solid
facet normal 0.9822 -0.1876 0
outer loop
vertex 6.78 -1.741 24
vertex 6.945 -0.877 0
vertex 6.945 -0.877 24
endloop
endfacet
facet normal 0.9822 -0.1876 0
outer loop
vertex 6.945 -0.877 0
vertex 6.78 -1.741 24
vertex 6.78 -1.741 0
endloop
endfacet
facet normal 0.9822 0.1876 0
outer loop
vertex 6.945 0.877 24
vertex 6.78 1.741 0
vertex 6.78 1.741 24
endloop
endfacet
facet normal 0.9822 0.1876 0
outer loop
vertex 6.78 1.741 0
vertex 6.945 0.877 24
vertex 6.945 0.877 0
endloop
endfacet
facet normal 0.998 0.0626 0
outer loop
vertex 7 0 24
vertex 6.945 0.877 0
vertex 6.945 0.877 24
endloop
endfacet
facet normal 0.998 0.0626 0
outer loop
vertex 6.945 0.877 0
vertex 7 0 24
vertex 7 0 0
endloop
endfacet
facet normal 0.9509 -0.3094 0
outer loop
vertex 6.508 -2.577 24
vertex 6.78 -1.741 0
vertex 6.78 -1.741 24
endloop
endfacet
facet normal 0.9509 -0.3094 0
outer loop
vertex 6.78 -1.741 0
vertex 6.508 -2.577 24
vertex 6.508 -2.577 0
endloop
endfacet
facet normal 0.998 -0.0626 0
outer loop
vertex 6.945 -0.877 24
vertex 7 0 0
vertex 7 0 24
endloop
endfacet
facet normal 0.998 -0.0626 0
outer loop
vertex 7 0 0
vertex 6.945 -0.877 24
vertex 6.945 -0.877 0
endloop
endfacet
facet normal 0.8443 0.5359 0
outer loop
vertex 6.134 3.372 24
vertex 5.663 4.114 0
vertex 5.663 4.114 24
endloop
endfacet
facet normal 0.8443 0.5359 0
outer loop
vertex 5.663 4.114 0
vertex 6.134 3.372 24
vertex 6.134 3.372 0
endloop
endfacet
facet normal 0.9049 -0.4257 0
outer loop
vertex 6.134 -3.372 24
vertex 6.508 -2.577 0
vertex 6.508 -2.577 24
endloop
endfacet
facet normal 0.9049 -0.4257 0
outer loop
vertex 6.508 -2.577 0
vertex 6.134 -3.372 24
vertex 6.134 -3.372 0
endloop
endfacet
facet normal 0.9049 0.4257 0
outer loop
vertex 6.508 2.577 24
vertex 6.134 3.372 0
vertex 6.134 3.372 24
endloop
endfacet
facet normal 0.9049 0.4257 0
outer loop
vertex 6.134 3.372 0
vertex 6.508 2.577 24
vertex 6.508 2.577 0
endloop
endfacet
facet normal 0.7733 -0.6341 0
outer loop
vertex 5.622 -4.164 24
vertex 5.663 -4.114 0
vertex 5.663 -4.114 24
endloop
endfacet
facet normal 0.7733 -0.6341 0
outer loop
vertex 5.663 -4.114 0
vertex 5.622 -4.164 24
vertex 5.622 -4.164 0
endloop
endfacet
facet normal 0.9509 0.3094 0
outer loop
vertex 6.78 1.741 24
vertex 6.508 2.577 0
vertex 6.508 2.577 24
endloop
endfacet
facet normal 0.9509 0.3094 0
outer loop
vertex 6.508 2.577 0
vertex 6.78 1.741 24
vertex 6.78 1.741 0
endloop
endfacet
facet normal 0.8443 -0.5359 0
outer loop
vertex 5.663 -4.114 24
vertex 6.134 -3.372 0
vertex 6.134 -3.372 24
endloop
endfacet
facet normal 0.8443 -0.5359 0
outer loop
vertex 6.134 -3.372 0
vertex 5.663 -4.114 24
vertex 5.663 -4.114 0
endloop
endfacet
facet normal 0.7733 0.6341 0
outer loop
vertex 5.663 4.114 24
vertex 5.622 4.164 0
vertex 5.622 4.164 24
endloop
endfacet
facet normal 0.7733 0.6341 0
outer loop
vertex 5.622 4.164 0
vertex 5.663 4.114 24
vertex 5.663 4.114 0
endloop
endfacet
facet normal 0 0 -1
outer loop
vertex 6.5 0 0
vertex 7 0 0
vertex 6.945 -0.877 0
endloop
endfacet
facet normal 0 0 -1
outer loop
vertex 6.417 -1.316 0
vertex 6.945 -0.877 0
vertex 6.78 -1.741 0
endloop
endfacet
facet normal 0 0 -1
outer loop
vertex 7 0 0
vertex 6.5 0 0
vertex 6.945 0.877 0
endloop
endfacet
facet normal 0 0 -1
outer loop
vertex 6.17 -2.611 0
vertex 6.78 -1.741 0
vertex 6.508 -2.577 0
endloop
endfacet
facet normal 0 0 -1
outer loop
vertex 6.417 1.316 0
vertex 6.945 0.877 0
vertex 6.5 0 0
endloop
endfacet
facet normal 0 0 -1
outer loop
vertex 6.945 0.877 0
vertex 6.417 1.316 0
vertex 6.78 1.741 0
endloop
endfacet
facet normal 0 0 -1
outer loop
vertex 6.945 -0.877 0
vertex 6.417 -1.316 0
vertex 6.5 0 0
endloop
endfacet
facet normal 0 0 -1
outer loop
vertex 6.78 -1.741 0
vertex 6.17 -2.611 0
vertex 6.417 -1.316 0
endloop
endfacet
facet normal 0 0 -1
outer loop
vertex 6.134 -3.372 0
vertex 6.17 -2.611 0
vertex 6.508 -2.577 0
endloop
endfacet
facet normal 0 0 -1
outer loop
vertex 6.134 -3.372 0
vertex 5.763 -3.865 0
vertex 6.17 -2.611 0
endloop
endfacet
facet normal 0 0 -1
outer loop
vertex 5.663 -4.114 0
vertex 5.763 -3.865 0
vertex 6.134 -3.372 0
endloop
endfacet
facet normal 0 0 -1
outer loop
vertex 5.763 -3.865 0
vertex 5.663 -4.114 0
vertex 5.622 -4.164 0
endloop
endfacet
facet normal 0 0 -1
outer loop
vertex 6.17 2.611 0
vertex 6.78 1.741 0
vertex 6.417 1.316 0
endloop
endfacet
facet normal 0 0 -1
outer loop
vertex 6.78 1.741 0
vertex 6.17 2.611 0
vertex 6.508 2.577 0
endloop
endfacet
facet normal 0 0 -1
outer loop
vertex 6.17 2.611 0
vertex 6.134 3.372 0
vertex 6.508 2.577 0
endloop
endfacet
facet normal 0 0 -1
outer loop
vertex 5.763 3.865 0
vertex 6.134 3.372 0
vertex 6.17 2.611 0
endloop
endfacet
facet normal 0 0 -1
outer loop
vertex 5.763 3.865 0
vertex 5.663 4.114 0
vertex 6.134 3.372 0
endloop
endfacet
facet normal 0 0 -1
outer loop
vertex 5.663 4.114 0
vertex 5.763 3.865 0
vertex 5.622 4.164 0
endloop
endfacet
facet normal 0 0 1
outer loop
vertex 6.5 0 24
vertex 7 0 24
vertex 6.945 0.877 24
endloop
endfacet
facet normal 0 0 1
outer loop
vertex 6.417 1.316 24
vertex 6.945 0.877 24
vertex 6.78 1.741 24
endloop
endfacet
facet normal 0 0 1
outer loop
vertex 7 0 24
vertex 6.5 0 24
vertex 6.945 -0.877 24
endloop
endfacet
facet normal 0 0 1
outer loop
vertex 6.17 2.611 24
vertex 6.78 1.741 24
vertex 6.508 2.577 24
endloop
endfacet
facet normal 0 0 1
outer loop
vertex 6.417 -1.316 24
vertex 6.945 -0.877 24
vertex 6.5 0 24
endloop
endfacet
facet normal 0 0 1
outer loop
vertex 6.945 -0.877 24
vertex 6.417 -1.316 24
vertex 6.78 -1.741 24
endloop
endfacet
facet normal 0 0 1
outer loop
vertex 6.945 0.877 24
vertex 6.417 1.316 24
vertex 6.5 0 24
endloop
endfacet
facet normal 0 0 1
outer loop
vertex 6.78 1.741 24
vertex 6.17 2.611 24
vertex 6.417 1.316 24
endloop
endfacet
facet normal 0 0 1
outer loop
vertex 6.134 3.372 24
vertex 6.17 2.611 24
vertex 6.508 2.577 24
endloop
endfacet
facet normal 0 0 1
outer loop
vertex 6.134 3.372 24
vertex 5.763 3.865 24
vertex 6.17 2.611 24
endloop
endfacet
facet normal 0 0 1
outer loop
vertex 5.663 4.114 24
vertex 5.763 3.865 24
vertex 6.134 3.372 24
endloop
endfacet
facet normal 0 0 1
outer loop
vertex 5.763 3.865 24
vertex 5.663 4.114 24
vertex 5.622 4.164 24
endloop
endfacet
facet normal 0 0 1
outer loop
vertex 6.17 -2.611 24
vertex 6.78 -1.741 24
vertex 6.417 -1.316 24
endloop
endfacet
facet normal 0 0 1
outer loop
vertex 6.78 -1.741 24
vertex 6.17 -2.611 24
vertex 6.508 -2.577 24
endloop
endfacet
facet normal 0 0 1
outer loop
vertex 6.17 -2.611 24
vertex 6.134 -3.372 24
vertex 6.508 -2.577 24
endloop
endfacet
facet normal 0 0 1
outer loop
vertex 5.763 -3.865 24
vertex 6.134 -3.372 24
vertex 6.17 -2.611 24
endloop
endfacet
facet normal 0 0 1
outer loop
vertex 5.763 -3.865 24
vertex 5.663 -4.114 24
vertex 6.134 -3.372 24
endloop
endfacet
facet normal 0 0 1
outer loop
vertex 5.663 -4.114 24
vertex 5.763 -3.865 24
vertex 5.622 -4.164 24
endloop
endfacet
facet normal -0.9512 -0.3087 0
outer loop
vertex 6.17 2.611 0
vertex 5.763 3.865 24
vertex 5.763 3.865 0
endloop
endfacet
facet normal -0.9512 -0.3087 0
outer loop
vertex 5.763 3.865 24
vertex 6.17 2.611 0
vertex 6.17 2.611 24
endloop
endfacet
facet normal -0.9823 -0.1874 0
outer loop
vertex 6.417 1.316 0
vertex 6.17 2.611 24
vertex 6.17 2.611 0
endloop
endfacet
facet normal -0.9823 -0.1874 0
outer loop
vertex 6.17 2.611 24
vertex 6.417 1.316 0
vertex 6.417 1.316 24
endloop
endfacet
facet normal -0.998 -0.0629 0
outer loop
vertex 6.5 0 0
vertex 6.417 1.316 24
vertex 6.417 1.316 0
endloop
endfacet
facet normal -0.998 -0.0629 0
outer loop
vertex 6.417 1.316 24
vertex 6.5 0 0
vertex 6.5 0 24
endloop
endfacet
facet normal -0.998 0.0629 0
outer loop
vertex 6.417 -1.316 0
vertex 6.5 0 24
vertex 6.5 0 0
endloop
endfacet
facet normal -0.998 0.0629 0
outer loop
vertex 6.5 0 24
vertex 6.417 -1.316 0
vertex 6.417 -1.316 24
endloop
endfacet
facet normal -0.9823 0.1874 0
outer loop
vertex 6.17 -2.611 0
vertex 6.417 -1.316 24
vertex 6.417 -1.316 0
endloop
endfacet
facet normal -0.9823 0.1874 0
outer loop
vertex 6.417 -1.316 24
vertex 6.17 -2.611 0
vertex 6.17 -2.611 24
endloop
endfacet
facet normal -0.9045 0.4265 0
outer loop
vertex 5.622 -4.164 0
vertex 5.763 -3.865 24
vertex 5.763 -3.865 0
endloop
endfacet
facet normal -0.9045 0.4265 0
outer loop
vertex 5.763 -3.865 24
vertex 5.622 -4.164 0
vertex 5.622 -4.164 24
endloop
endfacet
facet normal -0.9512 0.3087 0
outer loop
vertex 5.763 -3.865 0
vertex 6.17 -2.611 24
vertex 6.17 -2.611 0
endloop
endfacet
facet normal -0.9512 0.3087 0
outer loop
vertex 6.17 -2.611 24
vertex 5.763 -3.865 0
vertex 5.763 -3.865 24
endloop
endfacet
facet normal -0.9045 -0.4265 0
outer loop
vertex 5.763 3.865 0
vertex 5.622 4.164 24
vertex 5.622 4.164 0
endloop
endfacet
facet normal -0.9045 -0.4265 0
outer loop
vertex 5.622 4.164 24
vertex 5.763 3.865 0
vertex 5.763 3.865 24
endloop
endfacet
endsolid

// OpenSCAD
$fn = 50;


difference() {
	union() {
		cylinder(h = 24, r = 7.0000000000);
		translate(v = [-7.0000000000, 0, 0]) {
			cylinder(h = 24, r = 7.0000000000);
		}
	}
	union() {
		cylinder(h = 24, r = 3.2500000000);
		cylinder(h = 24, r = 1.8000000000);
		cylinder(h = 24, r = 1.8000000000);
		cylinder(h = 24, r = 1.8000000000);
		translate(v = [-11.5000000000, 0, 0]) {
			hull() {
				translate(v = [-3.7500000000, 0.0000000000, 0]) {
					cylinder(h = 24, r = 7.5000000000);
				}
				translate(v = [3.7500000000, 0.0000000000, 0]) {
					cylinder(h = 24, r = 7.5000000000);
				}
				translate(v = [-3.7500000000, -0.0000000000, 0]) {
					cylinder(h = 24, r = 7.5000000000);
				}
				translate(v = [3.7500000000, -0.0000000000, 0]) {
					cylinder(h = 24, r = 7.5000000000);
				}
			}
		}
		translate(v = [-4.0000000000, 0, 0.0000000000]) {
			cylinder(h = 24, r = 10.5000000000);
		}
	}
}
